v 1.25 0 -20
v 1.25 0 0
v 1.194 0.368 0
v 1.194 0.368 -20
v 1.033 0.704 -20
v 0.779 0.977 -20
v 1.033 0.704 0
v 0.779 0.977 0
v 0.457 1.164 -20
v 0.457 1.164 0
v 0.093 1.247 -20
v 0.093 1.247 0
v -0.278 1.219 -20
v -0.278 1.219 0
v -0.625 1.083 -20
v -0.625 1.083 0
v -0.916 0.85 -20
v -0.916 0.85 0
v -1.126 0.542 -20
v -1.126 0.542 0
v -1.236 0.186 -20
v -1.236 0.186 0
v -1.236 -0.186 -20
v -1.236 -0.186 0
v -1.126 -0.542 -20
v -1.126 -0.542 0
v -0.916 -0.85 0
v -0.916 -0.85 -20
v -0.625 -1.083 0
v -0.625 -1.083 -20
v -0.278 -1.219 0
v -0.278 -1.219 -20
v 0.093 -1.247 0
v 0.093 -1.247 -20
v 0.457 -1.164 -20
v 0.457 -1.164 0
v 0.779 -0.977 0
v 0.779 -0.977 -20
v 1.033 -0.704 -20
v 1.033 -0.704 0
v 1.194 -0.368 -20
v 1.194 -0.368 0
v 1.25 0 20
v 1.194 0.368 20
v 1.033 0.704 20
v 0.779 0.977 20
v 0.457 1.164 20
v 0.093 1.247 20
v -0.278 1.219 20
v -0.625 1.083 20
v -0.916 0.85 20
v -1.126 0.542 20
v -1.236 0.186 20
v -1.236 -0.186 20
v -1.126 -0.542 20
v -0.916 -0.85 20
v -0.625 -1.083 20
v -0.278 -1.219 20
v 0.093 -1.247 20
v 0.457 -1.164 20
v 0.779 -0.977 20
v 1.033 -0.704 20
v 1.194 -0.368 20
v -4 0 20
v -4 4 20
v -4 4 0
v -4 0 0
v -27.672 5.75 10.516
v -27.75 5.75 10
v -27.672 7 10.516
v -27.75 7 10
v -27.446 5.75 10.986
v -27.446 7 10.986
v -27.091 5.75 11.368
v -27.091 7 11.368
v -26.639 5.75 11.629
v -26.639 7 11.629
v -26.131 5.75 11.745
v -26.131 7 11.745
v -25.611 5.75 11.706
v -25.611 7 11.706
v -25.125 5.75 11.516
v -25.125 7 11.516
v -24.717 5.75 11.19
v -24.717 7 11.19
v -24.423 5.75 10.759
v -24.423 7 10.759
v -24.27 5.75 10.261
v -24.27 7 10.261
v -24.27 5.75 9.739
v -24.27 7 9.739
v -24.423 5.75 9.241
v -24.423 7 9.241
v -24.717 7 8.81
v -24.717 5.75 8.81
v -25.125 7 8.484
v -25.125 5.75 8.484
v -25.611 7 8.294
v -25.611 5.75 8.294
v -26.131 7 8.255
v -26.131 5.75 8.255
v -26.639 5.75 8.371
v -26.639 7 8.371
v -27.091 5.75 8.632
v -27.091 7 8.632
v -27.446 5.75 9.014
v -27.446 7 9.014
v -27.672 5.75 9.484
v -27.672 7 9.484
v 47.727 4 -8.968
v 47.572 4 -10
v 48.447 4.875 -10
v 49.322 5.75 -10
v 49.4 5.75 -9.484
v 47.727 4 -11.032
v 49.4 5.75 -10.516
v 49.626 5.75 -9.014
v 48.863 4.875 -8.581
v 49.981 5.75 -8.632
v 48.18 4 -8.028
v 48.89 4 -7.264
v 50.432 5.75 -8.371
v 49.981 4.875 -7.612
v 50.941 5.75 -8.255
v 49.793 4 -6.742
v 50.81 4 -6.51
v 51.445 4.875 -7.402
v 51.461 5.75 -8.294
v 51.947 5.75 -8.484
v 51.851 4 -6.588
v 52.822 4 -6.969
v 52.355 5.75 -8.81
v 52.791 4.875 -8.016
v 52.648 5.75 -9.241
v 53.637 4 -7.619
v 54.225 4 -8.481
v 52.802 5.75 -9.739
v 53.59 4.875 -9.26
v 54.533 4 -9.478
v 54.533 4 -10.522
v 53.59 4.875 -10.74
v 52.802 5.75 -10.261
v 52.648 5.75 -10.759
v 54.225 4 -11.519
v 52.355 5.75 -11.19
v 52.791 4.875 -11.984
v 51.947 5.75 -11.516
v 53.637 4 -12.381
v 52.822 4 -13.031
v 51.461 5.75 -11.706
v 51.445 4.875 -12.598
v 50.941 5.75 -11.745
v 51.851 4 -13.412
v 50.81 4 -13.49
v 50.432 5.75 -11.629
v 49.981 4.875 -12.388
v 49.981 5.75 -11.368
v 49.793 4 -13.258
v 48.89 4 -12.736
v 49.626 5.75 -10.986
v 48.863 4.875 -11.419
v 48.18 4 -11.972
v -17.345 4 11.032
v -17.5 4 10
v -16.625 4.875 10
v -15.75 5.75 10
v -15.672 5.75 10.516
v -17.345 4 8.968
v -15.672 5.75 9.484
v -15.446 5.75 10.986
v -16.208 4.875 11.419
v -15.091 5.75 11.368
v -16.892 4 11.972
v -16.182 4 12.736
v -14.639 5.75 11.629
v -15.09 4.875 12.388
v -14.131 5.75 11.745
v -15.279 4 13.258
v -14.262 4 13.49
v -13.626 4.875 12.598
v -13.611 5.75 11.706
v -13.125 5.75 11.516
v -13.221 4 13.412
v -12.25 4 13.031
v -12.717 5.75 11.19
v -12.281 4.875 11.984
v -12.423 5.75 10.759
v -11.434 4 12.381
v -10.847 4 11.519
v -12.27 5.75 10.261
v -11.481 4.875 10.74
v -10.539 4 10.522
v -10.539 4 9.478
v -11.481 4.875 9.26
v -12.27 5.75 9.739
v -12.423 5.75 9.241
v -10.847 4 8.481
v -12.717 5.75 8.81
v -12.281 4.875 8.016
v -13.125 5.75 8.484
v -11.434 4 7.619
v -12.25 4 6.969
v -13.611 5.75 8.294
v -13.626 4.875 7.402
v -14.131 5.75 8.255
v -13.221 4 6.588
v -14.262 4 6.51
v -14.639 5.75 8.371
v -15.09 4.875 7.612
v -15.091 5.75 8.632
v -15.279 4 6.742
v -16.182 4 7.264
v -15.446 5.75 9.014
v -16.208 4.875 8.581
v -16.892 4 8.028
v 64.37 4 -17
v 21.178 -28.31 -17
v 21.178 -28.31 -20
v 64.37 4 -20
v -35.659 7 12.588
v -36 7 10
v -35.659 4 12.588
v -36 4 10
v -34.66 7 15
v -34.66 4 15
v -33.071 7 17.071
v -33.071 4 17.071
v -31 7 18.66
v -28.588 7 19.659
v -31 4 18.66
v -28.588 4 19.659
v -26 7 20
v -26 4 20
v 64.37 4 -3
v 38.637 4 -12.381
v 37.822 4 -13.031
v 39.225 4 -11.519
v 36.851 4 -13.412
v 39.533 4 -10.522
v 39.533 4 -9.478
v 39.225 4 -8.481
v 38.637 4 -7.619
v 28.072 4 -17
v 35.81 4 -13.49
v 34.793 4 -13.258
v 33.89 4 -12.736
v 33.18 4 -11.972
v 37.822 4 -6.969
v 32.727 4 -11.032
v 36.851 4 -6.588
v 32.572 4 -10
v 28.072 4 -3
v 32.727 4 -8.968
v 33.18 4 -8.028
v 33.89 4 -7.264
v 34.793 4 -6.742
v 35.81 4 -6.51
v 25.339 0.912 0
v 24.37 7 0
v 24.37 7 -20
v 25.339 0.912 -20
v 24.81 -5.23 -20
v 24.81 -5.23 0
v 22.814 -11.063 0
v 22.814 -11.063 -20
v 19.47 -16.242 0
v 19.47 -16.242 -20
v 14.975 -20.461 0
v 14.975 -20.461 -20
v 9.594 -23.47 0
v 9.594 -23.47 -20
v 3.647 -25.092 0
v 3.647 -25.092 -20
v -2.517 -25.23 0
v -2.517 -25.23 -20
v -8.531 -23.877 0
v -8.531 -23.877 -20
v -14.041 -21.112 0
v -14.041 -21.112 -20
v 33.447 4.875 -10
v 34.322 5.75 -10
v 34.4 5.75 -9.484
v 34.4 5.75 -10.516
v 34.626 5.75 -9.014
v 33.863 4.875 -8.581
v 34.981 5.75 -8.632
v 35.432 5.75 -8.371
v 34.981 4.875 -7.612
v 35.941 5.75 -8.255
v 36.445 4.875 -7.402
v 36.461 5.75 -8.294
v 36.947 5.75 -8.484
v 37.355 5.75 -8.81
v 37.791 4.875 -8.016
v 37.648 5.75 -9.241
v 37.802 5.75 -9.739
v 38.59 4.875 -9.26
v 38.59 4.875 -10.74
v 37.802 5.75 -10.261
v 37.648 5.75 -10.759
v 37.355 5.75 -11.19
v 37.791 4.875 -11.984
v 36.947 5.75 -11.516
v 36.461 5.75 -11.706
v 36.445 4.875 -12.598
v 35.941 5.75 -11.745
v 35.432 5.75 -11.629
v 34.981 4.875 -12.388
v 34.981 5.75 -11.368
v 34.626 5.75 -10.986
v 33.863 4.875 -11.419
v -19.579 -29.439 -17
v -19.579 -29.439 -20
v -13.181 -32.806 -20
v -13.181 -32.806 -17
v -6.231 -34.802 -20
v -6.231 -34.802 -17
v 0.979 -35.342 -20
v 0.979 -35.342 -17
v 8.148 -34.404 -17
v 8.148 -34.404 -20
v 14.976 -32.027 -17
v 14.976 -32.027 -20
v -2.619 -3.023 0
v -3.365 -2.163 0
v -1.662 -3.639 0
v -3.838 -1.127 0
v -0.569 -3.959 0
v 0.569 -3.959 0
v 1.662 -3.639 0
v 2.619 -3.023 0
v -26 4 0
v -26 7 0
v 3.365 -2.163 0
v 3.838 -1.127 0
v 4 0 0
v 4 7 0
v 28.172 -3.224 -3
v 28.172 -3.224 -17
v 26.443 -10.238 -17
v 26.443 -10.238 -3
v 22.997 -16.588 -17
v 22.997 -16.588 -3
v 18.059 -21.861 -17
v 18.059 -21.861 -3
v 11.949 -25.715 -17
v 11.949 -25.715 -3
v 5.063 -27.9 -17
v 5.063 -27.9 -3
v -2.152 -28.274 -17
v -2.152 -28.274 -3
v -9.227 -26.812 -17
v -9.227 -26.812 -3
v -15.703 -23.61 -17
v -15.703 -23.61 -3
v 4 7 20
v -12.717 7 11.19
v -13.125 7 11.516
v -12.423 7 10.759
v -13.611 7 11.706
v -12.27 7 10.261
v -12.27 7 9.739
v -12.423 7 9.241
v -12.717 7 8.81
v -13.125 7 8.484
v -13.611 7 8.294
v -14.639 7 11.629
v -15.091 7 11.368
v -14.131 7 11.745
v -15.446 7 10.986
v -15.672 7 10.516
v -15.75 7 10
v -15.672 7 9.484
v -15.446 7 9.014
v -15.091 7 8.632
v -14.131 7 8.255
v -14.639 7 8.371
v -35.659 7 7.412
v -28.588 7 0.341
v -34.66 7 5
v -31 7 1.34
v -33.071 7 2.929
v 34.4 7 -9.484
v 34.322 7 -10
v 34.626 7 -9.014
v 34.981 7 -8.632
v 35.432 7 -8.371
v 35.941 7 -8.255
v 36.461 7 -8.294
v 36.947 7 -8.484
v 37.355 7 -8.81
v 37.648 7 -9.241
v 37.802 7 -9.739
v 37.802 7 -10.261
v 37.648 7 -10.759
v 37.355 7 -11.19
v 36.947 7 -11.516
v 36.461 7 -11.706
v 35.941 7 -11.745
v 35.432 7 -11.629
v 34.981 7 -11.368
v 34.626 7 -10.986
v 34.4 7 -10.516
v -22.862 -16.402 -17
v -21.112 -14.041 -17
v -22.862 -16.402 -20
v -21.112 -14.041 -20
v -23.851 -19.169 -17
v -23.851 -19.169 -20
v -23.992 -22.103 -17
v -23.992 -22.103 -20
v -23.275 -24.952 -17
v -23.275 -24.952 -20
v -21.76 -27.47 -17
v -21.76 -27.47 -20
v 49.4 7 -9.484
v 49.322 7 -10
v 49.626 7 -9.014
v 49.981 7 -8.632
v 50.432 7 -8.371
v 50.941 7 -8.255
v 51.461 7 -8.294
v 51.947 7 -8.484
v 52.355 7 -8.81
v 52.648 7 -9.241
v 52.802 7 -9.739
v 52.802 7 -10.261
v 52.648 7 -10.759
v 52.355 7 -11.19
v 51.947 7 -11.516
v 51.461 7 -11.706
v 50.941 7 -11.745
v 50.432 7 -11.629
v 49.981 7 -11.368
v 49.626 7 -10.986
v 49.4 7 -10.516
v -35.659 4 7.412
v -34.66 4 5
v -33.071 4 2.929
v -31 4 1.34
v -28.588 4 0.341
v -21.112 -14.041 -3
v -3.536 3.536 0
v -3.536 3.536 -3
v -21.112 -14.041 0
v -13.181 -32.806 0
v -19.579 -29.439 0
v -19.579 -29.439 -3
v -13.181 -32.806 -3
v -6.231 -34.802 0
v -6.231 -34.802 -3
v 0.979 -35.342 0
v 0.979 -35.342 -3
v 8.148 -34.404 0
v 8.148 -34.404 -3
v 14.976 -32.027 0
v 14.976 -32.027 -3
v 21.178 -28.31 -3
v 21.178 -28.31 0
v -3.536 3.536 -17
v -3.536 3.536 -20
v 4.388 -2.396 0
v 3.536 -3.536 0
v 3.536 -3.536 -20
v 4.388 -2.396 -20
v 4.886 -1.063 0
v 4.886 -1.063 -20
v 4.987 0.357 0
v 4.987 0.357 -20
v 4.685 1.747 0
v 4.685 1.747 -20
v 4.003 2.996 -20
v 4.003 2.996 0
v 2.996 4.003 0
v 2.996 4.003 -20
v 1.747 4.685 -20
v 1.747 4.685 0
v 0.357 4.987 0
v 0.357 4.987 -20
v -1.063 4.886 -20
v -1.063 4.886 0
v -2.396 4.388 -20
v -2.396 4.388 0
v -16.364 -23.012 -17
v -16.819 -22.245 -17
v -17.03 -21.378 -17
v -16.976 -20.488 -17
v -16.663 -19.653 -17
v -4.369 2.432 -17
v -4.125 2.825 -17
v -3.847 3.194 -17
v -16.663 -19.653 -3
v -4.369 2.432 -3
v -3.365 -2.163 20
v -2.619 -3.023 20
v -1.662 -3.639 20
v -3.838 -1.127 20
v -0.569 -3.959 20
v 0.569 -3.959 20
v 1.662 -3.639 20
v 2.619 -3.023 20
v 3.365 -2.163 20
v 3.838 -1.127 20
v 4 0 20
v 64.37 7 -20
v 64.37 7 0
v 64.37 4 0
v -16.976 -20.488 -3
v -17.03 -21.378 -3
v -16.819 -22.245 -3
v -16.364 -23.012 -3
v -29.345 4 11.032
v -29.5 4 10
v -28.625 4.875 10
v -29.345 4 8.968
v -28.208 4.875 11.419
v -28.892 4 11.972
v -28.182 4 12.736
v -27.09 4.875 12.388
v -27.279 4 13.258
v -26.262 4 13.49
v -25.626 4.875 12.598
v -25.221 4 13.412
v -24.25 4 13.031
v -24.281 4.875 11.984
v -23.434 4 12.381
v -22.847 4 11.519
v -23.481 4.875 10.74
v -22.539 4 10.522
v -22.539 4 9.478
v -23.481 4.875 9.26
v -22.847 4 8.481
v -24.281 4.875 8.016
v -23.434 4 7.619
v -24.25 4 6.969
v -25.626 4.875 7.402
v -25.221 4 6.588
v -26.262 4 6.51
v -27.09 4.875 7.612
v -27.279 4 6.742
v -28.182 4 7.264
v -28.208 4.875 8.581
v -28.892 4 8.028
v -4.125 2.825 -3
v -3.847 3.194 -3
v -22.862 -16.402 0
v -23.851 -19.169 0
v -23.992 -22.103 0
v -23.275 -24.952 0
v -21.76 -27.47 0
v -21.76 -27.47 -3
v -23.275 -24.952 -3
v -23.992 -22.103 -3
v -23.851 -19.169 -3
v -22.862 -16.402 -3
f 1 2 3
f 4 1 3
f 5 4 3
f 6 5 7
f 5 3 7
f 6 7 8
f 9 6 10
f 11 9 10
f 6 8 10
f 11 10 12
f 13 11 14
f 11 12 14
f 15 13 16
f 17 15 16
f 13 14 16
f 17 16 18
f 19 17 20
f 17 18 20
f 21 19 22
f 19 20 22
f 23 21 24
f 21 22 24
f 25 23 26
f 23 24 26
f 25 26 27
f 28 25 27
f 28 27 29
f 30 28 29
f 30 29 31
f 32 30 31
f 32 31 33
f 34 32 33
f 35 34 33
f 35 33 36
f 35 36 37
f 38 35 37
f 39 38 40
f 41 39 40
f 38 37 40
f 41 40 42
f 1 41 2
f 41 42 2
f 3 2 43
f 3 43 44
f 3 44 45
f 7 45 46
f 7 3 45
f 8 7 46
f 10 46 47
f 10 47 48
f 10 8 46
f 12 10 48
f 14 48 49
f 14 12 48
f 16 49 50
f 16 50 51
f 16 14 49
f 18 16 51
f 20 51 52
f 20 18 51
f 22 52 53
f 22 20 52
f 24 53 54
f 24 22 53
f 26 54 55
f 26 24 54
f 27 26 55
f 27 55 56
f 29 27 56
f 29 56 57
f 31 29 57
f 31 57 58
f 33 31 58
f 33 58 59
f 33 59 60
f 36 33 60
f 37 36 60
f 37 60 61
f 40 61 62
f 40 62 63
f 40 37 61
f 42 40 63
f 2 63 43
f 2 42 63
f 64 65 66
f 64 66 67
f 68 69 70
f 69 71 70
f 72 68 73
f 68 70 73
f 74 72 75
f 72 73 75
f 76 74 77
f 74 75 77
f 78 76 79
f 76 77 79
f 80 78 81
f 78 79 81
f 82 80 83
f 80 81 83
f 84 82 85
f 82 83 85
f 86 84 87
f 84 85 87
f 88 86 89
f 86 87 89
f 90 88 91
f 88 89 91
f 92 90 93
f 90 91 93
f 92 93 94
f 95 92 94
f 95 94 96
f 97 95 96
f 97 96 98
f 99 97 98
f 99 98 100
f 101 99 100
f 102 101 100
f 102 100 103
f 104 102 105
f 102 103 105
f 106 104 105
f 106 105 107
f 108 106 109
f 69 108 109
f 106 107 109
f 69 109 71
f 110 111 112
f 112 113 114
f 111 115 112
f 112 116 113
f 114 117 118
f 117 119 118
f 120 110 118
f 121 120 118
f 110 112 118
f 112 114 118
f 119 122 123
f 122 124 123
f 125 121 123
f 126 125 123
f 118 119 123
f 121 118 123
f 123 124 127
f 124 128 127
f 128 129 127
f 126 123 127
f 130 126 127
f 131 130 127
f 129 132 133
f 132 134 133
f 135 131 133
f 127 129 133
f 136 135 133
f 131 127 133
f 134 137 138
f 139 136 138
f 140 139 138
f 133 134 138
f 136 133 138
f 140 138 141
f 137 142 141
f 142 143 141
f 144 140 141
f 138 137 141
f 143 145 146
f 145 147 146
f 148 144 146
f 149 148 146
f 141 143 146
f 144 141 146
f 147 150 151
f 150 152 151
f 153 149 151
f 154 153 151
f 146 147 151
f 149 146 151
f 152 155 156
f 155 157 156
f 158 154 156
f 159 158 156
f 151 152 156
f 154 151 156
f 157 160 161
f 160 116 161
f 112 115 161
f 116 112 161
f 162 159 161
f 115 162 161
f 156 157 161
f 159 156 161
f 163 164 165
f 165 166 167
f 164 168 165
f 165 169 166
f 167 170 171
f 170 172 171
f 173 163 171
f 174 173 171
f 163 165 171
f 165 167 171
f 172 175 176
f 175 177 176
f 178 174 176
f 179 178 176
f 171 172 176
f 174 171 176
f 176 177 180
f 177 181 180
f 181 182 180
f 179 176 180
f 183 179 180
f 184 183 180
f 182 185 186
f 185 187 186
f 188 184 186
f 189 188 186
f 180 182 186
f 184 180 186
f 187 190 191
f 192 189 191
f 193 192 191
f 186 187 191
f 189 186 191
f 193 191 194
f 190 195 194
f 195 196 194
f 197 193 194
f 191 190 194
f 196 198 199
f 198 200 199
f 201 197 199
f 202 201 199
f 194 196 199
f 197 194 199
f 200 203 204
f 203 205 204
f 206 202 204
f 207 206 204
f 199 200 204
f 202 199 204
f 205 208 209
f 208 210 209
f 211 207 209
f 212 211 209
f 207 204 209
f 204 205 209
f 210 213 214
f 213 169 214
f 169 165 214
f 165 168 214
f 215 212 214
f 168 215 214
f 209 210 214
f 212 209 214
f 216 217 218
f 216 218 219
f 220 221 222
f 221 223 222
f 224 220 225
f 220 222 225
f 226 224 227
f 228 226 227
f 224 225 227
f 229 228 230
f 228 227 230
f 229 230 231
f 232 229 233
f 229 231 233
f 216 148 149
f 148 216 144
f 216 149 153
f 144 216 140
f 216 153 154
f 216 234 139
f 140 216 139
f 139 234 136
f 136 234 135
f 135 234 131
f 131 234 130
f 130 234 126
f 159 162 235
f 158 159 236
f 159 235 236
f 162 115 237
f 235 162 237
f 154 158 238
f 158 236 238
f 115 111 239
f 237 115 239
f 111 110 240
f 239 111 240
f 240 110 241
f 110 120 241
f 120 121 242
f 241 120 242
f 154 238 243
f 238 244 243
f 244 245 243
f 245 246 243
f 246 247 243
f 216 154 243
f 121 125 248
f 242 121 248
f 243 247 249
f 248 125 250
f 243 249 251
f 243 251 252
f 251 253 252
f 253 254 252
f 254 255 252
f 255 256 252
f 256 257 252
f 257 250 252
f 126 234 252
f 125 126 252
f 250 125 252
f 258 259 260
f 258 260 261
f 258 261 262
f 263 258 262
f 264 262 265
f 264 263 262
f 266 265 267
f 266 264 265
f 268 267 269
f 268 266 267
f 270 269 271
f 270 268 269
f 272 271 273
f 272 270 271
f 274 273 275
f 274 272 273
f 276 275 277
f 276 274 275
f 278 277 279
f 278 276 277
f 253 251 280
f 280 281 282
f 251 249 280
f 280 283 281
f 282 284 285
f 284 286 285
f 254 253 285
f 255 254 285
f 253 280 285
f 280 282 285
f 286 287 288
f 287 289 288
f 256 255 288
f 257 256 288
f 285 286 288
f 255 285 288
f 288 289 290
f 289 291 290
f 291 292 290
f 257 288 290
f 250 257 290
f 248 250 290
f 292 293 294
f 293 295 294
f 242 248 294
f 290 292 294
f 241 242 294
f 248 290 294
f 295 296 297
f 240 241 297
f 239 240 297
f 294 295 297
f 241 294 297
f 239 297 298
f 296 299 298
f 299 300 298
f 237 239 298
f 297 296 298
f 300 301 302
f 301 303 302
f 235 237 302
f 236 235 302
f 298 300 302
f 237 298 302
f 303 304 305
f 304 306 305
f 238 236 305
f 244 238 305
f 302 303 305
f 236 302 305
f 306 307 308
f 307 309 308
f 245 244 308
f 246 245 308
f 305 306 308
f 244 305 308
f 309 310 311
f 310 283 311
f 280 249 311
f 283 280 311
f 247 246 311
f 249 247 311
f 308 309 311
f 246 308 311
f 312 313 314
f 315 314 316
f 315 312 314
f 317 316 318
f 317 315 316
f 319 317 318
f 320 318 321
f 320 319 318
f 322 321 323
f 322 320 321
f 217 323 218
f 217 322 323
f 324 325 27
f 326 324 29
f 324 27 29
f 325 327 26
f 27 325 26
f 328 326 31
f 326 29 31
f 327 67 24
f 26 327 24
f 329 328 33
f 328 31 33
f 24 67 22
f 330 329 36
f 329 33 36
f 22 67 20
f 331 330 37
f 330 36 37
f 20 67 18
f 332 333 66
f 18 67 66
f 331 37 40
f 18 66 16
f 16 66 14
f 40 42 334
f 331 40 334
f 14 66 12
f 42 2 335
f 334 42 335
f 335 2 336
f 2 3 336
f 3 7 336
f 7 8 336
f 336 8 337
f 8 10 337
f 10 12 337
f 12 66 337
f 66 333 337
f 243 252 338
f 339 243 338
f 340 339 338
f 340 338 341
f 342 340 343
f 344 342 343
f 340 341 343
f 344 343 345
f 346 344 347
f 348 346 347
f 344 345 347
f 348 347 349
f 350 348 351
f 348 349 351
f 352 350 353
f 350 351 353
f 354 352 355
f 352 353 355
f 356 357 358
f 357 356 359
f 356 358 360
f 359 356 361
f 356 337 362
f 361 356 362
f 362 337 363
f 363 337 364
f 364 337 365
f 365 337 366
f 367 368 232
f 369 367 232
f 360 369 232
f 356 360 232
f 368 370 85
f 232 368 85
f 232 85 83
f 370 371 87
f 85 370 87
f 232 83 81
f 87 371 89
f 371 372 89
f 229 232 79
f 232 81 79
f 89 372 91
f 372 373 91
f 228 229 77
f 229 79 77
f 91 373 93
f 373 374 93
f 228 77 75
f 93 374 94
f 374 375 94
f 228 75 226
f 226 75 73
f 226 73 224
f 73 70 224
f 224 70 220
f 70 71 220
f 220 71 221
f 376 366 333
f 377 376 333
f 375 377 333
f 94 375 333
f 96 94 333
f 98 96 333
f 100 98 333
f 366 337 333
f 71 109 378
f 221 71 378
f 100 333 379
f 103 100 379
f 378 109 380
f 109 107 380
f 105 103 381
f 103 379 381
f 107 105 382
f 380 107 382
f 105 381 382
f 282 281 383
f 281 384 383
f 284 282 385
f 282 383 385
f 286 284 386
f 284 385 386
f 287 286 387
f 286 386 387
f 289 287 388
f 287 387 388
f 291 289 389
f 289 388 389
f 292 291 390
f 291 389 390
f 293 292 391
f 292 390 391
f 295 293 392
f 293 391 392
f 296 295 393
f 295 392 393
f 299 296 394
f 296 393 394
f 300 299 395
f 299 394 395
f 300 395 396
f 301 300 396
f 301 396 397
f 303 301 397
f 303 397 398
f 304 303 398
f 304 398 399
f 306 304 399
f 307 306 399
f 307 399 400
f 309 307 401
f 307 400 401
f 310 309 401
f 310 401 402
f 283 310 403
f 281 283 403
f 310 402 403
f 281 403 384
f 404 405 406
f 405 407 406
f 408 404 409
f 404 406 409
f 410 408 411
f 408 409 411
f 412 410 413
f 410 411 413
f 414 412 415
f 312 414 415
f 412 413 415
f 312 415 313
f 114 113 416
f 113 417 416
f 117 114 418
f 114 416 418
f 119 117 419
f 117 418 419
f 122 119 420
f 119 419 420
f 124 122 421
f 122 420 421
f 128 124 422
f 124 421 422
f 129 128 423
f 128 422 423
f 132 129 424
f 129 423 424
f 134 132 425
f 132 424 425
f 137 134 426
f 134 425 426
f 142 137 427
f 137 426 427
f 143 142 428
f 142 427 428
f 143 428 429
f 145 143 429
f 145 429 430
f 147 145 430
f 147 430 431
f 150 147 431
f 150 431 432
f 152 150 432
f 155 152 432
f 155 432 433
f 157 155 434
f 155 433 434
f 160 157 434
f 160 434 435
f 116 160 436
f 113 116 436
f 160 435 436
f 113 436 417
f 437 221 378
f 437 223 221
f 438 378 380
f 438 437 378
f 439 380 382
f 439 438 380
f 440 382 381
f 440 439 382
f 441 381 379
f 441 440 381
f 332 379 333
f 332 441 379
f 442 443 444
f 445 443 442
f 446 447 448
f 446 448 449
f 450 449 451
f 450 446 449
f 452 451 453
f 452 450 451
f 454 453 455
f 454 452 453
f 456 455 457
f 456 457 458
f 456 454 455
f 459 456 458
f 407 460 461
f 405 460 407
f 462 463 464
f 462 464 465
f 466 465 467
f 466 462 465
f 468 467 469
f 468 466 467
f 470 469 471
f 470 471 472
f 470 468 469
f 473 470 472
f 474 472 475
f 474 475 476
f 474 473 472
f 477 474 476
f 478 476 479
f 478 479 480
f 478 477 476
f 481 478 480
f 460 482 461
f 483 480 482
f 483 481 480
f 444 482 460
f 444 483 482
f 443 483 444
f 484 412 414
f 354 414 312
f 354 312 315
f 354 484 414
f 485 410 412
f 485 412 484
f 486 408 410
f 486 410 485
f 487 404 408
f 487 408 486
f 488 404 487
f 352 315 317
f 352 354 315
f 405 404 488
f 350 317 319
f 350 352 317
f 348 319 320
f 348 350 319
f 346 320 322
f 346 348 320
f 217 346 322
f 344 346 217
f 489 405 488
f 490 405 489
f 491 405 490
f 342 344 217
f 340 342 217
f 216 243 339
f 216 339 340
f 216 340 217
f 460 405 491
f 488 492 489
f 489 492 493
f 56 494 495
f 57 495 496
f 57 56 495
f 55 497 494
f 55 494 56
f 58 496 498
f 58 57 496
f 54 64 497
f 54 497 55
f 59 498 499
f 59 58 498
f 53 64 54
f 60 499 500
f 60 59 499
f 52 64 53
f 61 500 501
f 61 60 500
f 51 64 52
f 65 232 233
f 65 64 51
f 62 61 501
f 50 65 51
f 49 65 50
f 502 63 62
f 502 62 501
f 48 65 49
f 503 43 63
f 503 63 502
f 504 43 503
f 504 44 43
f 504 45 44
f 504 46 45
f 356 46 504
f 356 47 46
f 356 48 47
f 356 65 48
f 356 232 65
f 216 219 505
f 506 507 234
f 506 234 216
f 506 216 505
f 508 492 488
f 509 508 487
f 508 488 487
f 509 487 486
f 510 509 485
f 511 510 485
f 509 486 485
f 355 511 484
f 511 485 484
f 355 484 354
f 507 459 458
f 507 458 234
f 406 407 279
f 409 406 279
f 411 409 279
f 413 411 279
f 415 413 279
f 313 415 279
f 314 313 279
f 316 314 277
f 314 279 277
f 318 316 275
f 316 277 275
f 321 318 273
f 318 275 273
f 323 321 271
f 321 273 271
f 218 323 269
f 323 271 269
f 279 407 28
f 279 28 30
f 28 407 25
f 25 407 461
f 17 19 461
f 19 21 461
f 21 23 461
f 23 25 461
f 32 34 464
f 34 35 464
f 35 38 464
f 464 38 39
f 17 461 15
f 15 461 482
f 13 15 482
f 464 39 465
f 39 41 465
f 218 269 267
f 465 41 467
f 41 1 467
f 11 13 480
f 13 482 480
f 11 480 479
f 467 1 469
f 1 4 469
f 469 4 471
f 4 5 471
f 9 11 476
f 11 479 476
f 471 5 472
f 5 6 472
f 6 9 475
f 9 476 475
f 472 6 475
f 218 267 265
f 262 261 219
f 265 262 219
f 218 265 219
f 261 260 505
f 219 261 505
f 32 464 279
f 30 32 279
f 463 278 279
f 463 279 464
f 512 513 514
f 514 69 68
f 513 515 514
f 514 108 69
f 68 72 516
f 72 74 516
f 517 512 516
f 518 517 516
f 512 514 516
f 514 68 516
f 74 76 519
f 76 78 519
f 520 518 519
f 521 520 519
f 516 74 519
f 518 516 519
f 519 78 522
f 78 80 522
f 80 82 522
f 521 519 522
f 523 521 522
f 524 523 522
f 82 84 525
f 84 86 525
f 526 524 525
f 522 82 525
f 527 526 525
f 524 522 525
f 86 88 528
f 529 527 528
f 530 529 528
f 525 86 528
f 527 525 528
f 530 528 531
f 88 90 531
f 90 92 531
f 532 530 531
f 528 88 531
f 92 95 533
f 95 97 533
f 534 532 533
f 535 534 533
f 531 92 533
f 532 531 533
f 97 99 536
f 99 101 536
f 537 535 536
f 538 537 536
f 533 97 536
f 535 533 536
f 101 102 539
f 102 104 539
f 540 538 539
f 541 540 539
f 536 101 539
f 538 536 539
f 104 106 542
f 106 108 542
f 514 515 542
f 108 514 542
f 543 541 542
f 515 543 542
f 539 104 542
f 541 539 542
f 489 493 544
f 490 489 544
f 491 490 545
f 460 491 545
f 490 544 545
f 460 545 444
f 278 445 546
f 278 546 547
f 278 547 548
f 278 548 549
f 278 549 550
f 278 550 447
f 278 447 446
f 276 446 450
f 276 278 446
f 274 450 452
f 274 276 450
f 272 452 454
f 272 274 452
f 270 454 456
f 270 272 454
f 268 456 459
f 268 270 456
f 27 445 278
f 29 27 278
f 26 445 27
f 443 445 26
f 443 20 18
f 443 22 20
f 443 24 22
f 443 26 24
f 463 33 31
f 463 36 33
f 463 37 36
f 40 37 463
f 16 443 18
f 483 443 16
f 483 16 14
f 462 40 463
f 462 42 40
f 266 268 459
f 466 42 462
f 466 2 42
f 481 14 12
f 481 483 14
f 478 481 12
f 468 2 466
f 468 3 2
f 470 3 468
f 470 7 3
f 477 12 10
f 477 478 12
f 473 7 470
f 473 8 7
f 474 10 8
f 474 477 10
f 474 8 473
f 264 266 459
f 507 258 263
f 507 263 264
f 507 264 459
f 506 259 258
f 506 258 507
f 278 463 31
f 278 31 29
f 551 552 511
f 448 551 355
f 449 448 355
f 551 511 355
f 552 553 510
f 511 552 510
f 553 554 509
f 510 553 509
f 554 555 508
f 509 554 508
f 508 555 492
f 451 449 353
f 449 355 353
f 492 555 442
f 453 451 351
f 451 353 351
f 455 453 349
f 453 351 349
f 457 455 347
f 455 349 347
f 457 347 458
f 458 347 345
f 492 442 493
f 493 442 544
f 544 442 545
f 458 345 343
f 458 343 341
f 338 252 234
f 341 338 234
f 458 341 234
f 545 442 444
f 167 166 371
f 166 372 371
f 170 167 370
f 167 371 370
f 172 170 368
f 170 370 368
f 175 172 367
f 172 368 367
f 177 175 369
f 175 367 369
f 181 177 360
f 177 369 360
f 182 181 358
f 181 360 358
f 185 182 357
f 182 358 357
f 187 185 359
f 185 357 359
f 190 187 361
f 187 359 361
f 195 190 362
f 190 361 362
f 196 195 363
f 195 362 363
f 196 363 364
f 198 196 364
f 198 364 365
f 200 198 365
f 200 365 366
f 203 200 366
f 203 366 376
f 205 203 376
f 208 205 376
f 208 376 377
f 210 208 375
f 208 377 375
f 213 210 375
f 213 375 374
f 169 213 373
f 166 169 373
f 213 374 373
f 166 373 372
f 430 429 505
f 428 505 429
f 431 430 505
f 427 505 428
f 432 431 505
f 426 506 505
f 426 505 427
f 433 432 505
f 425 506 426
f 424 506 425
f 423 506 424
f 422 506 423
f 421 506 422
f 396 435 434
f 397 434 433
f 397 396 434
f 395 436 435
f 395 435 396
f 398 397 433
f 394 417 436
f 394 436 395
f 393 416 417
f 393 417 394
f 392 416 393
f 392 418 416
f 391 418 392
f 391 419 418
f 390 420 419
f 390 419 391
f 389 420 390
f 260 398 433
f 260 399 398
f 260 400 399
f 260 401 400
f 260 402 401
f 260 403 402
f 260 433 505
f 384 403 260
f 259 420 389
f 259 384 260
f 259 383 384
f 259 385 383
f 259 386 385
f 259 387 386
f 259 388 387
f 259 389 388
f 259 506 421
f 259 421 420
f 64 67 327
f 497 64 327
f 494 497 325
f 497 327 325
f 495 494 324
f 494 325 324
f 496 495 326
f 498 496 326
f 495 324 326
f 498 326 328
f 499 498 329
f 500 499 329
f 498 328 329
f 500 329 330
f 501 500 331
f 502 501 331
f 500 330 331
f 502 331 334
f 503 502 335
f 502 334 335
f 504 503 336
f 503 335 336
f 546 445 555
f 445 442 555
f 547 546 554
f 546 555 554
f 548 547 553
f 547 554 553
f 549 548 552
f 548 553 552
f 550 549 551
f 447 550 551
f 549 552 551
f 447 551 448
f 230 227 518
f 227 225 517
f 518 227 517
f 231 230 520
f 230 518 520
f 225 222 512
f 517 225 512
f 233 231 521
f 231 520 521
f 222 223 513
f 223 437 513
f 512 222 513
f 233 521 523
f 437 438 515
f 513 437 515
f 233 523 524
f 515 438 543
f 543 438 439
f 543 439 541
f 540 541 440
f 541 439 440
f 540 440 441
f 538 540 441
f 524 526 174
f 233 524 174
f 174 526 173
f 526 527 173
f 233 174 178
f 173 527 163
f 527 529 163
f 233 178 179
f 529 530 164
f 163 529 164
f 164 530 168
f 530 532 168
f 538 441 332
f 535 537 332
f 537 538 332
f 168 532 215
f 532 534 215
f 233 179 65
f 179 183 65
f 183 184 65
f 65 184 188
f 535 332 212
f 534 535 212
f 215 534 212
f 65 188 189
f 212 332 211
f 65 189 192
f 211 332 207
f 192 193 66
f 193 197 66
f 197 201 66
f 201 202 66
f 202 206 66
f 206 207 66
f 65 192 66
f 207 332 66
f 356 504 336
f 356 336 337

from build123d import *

# Parameters (mm, degrees)
F0_R             = 1.25
F2_DEPTH         = 20
F1_R             = 1.25
F3_DEPTH         = 20
F4_START         = -3
F4_DEPTH         = 14
F5_R             = 9.99999
F5_2_R           = 9.99999
F6_R             = 3
F8_D             = 3.5
F8_DEPTH         = 20
F8_CSINK_D       = 7
F8_CSINK_ANGLE   = 90
F8_TIP           = 1.0515060833
F8_2_D           = 3.5
F8_2_DEPTH       = 20
F8_2_CSINK_D     = 7
F8_2_CSINK_ANGLE = 90
F8_2_TIP         = 1.0515060833


# Not quite as in the source:
# - a fillet or chamfer is up to 0.001 mm smaller than in the source, because OpenCascade refuses the exact size


with BuildPart() as f2:
    # F0 (on Top) → F2 (new body)
    with BuildSketch(Plane.XY):
        with BuildLine():
            Line((4, 7), (-36, 7))
            Line((-36, 7), (-36, 4))
            Line((-36, 4), (-4, 4))
            Line((-4, 4), (-4, 0))
            ThreePointArc((-4, 0), (0, -4), (4, 0))
            Line((4, 0), (4, 7))
        make_face()
        Circle(F0_R, mode=Mode.SUBTRACT)
    extrude(amount=F2_DEPTH)

    # F5 (radius 10 in the source; OpenCascade refuses exactly that, so slightly less here)
    f5_edges = [f2.edges().sort_by_distance(p)[0] for p in [
        (-36, 5.5, 20),
        (-36, 5.5, 0),
    ]]
    fillet(f5_edges, radius=F5_R)

    # F8
    with Locations(Plane.XZ.offset(-4)):
        with Locations((-26, 10), (-14, 10), (36.0717874951, -10), (51.0717874951, -10)):
            CounterSinkHole(F8_D / 2, F8_CSINK_D / 2, depth=F8_DEPTH, counter_sink_angle=F8_CSINK_ANGLE)
            with Locations((0, 0, -(F8_DEPTH + F8_TIP / 2))):  # 118° drill point
                Cone(0, F8_D / 2, F8_TIP, mode=Mode.SUBTRACT)


with BuildPart() as f3:
    # F1 (on Top) → F3 (new body)
    with BuildSketch(Plane.XY):
        with BuildLine():
            Line((-14.0413432173, -21.1124110292), (3.5355339059, -3.5355339059))
            ThreePointArc((3.5355339059, -3.5355339059), (3.5355339059, 3.5355339059), (-3.5355339059, 3.5355339059))
            ThreePointArc((-3.5355339059, 3.5355339059), (-3.9904772202, 3.0126552334), (-4.3687434308, 2.4318883272))
            Line((-4.3687434308, 2.4318883272), (-17.9440420579, -21.9553321039))
            ThreePointArc((-17.9440420579, -21.9553321039), (13.9306361328, -24.6974215274), (28.0717874951, 4))
            Line((28.0717874951, 4), (64.3699244729, 4))
            Line((64.3699244729, 4), (64.3699244729, 7))
            Line((64.3699244729, 7), (24.3699244729, 7))
            ThreePointArc((24.3699244729, 7), (14.9748726591, -20.4608506093), (-14.0413432173, -21.1124110292))
        make_face()
        Circle(F1_R, mode=Mode.SUBTRACT)
        with BuildLine():
            ThreePointArc((-4.3687434308, 2.4318883272), (-3.9904772202, 3.0126552334), (-3.5355339059, 3.5355339059))
            Line((-3.5355339059, 3.5355339059), (-28.2842712475, -21.2132034356))
            ThreePointArc((-28.2842712475, -21.2132034356), (-5.0216203507, -34.9969045639), (21.1782419461, -28.3104586341))
            Line((21.1782419461, -28.3104586341), (64.3699244729, 4))
            Line((64.3699244729, 4), (28.0717874951, 4))
            ThreePointArc((28.0717874951, 4), (13.9306361328, -24.6974215274), (-17.9440420579, -21.9553321039))
            Line((-17.9440420579, -21.9553321039), (-4.3687434308, 2.4318883272))
        make_face()
    extrude(amount=-F3_DEPTH)

    # F1 (on Top) → F4 (cut)
    with BuildSketch(Plane.XY.offset(F4_START)):
        with BuildLine():
            ThreePointArc((-4.3687434308, 2.4318883272), (-3.9904772202, 3.0126552334), (-3.5355339059, 3.5355339059))
            Line((-3.5355339059, 3.5355339059), (-28.2842712475, -21.2132034356))
            ThreePointArc((-28.2842712475, -21.2132034356), (-5.0216203507, -34.9969045639), (21.1782419461, -28.3104586341))
            Line((21.1782419461, -28.3104586341), (64.3699244729, 4))
            Line((64.3699244729, 4), (28.0717874951, 4))
            ThreePointArc((28.0717874951, 4), (13.9306361328, -24.6974215274), (-17.9440420579, -21.9553321039))
            Line((-17.9440420579, -21.9553321039), (-4.3687434308, 2.4318883272))
        make_face()
    extrude(amount=-F4_DEPTH, mode=Mode.SUBTRACT)

    # F5#2 (radius 10 in the source; OpenCascade refuses exactly that, so slightly less here)
    f5_2_edges = [f3.edges().sort_by_distance(p)[0] for p in [
        (-28.284271, -21.213203, -1.5),
        (-28.284271, -21.213203, -18.5),
    ]]
    fillet(f5_2_edges, radius=F5_2_R)

    # F6
    f6_edges = [f3.edges().sort_by_distance(p)[0] for p in [
        (-17.944042, -21.955332, -10),
    ]]
    fillet(f6_edges, radius=F6_R)

    # F8#2
    with Locations(Plane.XZ.offset(-4)):
        with Locations((-26, 10), (-14, 10), (36.0717874951, -10), (51.0717874951, -10)):
            CounterSinkHole(F8_2_D / 2, F8_2_CSINK_D / 2, depth=F8_2_DEPTH, counter_sink_angle=F8_2_CSINK_ANGLE)
            with Locations((0, 0, -(F8_2_DEPTH + F8_2_TIP / 2))):  # 118° drill point
                Cone(0, F8_2_D / 2, F8_2_TIP, mode=Mode.SUBTRACT)


solid = Compound([f2.part, f3.part])
